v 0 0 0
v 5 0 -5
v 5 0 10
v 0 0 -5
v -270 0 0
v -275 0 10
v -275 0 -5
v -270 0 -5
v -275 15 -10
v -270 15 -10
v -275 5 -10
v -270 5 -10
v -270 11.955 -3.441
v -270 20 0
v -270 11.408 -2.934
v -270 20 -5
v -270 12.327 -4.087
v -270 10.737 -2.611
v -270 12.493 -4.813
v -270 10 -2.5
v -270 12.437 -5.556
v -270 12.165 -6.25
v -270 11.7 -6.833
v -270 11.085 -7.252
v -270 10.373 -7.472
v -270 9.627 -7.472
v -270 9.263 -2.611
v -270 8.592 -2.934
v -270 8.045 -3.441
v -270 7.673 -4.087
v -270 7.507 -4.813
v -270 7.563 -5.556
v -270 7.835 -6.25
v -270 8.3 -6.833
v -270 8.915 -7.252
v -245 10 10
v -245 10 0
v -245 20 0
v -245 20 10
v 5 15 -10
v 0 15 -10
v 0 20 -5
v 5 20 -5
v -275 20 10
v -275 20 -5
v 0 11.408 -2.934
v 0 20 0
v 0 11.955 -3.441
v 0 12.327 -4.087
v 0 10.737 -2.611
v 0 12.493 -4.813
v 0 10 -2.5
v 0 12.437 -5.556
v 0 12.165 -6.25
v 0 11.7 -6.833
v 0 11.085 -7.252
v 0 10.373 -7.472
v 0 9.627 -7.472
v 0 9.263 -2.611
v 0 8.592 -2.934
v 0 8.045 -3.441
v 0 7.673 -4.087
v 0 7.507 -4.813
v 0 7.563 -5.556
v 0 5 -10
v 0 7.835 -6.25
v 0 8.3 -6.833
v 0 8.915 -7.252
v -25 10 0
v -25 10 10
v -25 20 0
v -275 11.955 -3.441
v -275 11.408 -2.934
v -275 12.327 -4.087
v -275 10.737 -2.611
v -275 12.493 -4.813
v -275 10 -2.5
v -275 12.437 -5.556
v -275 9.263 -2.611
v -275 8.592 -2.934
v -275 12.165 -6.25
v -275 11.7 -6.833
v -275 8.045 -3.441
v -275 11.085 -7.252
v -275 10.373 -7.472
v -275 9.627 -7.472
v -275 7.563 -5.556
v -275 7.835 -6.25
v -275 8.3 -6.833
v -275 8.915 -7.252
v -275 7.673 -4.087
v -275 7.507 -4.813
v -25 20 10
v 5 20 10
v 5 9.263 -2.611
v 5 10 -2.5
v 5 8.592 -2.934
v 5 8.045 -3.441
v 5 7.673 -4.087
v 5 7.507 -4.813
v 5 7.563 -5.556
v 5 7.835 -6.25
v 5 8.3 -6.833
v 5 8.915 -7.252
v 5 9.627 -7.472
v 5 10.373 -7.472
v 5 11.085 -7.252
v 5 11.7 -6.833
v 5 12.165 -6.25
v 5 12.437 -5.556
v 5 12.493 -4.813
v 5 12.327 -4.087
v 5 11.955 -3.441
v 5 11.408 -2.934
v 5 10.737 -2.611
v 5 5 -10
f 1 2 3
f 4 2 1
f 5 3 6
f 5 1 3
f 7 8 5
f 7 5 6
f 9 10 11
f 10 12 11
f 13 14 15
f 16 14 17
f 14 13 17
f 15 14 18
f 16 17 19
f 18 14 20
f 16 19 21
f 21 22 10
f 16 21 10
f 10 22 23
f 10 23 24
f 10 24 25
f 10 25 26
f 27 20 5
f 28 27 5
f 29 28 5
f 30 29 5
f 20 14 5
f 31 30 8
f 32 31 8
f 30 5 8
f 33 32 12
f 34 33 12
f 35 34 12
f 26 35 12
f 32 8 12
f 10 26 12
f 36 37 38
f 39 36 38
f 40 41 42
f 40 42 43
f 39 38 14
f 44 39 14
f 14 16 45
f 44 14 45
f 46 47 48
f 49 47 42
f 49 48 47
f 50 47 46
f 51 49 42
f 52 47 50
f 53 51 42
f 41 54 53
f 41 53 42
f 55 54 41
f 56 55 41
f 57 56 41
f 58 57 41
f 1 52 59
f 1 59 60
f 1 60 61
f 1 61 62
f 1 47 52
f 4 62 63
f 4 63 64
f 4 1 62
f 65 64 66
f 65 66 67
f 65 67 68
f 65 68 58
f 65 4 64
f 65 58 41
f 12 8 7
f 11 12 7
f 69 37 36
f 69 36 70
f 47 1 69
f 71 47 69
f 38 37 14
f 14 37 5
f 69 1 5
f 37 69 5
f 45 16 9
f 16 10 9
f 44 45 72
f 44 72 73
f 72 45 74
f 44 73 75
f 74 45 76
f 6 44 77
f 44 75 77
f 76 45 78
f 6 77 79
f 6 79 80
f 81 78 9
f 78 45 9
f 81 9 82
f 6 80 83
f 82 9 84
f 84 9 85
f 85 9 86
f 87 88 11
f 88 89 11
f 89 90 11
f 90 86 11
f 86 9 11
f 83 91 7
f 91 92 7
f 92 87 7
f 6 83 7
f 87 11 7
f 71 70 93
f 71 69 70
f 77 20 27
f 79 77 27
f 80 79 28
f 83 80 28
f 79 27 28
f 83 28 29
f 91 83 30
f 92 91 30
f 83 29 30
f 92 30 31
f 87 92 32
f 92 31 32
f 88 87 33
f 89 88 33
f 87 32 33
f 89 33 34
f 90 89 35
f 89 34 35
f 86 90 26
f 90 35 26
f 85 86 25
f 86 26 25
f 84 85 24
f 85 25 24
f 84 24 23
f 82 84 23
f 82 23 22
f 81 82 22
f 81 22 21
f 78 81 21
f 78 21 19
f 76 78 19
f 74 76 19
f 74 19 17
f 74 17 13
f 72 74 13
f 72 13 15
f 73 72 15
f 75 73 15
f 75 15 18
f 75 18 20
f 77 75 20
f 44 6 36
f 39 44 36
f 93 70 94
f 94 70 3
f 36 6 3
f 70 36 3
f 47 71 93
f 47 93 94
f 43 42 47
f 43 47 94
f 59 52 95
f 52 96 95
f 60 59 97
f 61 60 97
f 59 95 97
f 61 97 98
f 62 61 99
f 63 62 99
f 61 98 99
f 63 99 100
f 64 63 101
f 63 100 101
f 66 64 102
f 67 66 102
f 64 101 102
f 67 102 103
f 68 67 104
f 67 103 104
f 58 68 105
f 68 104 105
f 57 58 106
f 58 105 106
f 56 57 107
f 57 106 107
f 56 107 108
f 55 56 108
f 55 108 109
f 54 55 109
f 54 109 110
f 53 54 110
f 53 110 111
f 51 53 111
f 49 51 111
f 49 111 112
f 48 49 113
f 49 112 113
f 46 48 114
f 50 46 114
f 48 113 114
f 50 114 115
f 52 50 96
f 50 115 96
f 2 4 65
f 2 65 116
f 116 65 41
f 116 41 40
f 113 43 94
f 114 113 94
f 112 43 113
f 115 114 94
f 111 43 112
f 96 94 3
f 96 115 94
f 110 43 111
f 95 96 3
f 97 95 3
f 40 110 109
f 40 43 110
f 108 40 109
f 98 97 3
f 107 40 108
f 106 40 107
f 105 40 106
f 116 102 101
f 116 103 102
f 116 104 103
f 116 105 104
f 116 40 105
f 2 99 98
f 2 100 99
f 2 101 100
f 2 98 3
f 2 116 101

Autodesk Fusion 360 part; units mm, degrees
sketch "Sketch1" plane through (0, 0, 0) normal (0, 1, 0) x (1, 0, 0)
  line L0 (0, 0) -> (-25, 0)
  line L1 (-25, 0) -> (-25, -5)
  line L2 (-25, -5) -> (5, -5)
  line L3 (0, 0) -> (0, 10)
  line L4 (0, 10) -> (5, 10)
  line L5 (5, 10) -> (5, -5)
  line L6 (-25, 0) -> (-245, 0)
  line L7 (-245, 0) -> (-245, -5)
  line L8 (-245, -5) -> (-25, -5)
  line L9 (-25, 0) -> (-140, 0)
  line L10 (-140, 0) -> (-140, 27.0089)
  line L11 (-270, 10) -> (-275, 10)
  line L12 (-270, 0) -> (-270, 10)
  line L13 (-275, 10) -> (-275, -5)
  line L14 (-270, 0) -> (-245, 0)
  line L15 (-245, -5) -> (-275, -5)
  line L16 (-245, 0) -> (-245, -5)
  point P0 (-270, 0)
  dimension "d1" = 25
  dimension "d2" = 5
  dimension "d3" = 30
  dimension "d4" = 10
  dimension "d5" = 5
  dimension "d6" = 220
  dimension "d7" = 5
  dimension "d8" = 115
extrude "Extrude1" add sketch "Sketch1" along normal blind 10
extrude "Extrude2" add sketch "Sketch1" along normal blind 20 contours L0 L1 L2 L3 L4 L5 | L7 L11 L12 L13 L14 L15 L16
sketch "Sketch2" plane through (5, 0, 0) normal (1, 0, 0) x (0, 0, -1)
  line L0 (-5, 0) -> (10, 0)
  line L1 (10, 0) -> (10, 20)
  line L2 (10, 20) -> (-5, 20)
  line L3 (-5, 20) -> (-5, 0)
sketch "Sketch3" plane through (0, 0, 0) normal (-1, 0, 0) x (0, 0, 1)
  line L0 (-10, 0) -> (0, 0)
  line L1 (0, 0) -> (0, 20)
  line L2 (0, 20) -> (-10, 20)
  line L3 (-10, 20) -> (-10, 0)
  line L4 (-10, 0) -> (-5, 0)
  line L5 (-5, 0) -> (-5, 10)
  circle A0 centre (-5, 10) radius 2.5
  dimension "d13" = 5
  dimension "d14" = 10
  dimension "d15" = 5
extrude "Extrude3" cut sketch "Sketch3" along normal mid plane 662 contours A0
chamfer "Chamfer1" distance 5 angle 45 4 edges at (2.5, 20, -10) (2.5, 0, -10) (-272.5, 20, -10) (-272.5, 0, -10)
sketch "Sketch5" plane through (0, 10, 0) normal (0, 1, 0) x (-1, 0, 0)
  line L0 (25, 5) -> (25, 0)
  line L1 (25, 0) -> (245, 0)
  line L2 (245, 0) -> (245, 5)
  line L3 (245, 5) -> (25, 5)
  line L4 (245, 0) -> (135, 0)
  dimension "d30" = 110
sketch "Sketch6" plane through (0, 0, 5) normal (0, 0, 1) x (1, 0, 0)
  line L0 (-25, 10) -> (-245, 10)
  line L1 (-245, 10) -> (-245, 20)
  line L2 (-245, 20) -> (-275, 20)
  line L3 (-275, 20) -> (-275, 0)
  line L4 (-275, 0) -> (5, 0)
  line L5 (5, 0) -> (5, 20)
  line L6 (5, 20) -> (-25, 20)
  line L7 (-25, 20) -> (-25, 10)
extrude "Extrude5" add 1 faces at (-265, 10, 5) along direction (0, 0, 1) blind 5
sketch "Sketch7" plane through (0, 10, 0) normal (0, 1, 0) x (-1, 0, 0)
  line L0 (25, 10) -> (25, 0)
  line L1 (25, 0) -> (245, 0)
  line L2 (245, 0) -> (245, 10)
  line L3 (245, 10) -> (25, 10)
  line L4 (245, 0) -> (135, 0)
  line L5 (138.2622, 1.9923) -> (132.3533, 3.0342)
  line L6 (138.2622, 7.9923) -> (132.3533, 6.9504)
  line L7 (132.3533, 3.0342) -> (132.3533, 0)
  line L8 (138.2622, 7.9923) -> (138.2622, 1.9923)
  line L9 (132.3533, 6.9504) -> (132.3533, 10)
  line L10 (138.2622, 1.9923) -> (141.0619, 1.9923) construction
  line L11 (138.2622, 7.9923) -> (141.0619, 7.9923) construction
  line L12 (25, 0) -> (245, 0)
  line L13 (128.521, 0) -> (128.521, 5)
  line L14 (270, -5) -> (275, -5)
  line L15 (275, -5) -> (275, 10)
  line L16 (275, 10) -> (245, 10)
  line L17 (245, 10) -> (245, 0)
  line L18 (245, 0) -> (270, 0)
  line L19 (270, 0) -> (270, -5)
  point P0 (132.1074, 10.0354)
  point P1 (138.2622, 4.9923)
  dimension "d33" = 110
  dimension "d34" = 6
  dimension "d35" = 170
  dimension "d36" = 6
  dimension "d37" = 170
  dimension "d38" = 6
  dimension "d41" = 5
